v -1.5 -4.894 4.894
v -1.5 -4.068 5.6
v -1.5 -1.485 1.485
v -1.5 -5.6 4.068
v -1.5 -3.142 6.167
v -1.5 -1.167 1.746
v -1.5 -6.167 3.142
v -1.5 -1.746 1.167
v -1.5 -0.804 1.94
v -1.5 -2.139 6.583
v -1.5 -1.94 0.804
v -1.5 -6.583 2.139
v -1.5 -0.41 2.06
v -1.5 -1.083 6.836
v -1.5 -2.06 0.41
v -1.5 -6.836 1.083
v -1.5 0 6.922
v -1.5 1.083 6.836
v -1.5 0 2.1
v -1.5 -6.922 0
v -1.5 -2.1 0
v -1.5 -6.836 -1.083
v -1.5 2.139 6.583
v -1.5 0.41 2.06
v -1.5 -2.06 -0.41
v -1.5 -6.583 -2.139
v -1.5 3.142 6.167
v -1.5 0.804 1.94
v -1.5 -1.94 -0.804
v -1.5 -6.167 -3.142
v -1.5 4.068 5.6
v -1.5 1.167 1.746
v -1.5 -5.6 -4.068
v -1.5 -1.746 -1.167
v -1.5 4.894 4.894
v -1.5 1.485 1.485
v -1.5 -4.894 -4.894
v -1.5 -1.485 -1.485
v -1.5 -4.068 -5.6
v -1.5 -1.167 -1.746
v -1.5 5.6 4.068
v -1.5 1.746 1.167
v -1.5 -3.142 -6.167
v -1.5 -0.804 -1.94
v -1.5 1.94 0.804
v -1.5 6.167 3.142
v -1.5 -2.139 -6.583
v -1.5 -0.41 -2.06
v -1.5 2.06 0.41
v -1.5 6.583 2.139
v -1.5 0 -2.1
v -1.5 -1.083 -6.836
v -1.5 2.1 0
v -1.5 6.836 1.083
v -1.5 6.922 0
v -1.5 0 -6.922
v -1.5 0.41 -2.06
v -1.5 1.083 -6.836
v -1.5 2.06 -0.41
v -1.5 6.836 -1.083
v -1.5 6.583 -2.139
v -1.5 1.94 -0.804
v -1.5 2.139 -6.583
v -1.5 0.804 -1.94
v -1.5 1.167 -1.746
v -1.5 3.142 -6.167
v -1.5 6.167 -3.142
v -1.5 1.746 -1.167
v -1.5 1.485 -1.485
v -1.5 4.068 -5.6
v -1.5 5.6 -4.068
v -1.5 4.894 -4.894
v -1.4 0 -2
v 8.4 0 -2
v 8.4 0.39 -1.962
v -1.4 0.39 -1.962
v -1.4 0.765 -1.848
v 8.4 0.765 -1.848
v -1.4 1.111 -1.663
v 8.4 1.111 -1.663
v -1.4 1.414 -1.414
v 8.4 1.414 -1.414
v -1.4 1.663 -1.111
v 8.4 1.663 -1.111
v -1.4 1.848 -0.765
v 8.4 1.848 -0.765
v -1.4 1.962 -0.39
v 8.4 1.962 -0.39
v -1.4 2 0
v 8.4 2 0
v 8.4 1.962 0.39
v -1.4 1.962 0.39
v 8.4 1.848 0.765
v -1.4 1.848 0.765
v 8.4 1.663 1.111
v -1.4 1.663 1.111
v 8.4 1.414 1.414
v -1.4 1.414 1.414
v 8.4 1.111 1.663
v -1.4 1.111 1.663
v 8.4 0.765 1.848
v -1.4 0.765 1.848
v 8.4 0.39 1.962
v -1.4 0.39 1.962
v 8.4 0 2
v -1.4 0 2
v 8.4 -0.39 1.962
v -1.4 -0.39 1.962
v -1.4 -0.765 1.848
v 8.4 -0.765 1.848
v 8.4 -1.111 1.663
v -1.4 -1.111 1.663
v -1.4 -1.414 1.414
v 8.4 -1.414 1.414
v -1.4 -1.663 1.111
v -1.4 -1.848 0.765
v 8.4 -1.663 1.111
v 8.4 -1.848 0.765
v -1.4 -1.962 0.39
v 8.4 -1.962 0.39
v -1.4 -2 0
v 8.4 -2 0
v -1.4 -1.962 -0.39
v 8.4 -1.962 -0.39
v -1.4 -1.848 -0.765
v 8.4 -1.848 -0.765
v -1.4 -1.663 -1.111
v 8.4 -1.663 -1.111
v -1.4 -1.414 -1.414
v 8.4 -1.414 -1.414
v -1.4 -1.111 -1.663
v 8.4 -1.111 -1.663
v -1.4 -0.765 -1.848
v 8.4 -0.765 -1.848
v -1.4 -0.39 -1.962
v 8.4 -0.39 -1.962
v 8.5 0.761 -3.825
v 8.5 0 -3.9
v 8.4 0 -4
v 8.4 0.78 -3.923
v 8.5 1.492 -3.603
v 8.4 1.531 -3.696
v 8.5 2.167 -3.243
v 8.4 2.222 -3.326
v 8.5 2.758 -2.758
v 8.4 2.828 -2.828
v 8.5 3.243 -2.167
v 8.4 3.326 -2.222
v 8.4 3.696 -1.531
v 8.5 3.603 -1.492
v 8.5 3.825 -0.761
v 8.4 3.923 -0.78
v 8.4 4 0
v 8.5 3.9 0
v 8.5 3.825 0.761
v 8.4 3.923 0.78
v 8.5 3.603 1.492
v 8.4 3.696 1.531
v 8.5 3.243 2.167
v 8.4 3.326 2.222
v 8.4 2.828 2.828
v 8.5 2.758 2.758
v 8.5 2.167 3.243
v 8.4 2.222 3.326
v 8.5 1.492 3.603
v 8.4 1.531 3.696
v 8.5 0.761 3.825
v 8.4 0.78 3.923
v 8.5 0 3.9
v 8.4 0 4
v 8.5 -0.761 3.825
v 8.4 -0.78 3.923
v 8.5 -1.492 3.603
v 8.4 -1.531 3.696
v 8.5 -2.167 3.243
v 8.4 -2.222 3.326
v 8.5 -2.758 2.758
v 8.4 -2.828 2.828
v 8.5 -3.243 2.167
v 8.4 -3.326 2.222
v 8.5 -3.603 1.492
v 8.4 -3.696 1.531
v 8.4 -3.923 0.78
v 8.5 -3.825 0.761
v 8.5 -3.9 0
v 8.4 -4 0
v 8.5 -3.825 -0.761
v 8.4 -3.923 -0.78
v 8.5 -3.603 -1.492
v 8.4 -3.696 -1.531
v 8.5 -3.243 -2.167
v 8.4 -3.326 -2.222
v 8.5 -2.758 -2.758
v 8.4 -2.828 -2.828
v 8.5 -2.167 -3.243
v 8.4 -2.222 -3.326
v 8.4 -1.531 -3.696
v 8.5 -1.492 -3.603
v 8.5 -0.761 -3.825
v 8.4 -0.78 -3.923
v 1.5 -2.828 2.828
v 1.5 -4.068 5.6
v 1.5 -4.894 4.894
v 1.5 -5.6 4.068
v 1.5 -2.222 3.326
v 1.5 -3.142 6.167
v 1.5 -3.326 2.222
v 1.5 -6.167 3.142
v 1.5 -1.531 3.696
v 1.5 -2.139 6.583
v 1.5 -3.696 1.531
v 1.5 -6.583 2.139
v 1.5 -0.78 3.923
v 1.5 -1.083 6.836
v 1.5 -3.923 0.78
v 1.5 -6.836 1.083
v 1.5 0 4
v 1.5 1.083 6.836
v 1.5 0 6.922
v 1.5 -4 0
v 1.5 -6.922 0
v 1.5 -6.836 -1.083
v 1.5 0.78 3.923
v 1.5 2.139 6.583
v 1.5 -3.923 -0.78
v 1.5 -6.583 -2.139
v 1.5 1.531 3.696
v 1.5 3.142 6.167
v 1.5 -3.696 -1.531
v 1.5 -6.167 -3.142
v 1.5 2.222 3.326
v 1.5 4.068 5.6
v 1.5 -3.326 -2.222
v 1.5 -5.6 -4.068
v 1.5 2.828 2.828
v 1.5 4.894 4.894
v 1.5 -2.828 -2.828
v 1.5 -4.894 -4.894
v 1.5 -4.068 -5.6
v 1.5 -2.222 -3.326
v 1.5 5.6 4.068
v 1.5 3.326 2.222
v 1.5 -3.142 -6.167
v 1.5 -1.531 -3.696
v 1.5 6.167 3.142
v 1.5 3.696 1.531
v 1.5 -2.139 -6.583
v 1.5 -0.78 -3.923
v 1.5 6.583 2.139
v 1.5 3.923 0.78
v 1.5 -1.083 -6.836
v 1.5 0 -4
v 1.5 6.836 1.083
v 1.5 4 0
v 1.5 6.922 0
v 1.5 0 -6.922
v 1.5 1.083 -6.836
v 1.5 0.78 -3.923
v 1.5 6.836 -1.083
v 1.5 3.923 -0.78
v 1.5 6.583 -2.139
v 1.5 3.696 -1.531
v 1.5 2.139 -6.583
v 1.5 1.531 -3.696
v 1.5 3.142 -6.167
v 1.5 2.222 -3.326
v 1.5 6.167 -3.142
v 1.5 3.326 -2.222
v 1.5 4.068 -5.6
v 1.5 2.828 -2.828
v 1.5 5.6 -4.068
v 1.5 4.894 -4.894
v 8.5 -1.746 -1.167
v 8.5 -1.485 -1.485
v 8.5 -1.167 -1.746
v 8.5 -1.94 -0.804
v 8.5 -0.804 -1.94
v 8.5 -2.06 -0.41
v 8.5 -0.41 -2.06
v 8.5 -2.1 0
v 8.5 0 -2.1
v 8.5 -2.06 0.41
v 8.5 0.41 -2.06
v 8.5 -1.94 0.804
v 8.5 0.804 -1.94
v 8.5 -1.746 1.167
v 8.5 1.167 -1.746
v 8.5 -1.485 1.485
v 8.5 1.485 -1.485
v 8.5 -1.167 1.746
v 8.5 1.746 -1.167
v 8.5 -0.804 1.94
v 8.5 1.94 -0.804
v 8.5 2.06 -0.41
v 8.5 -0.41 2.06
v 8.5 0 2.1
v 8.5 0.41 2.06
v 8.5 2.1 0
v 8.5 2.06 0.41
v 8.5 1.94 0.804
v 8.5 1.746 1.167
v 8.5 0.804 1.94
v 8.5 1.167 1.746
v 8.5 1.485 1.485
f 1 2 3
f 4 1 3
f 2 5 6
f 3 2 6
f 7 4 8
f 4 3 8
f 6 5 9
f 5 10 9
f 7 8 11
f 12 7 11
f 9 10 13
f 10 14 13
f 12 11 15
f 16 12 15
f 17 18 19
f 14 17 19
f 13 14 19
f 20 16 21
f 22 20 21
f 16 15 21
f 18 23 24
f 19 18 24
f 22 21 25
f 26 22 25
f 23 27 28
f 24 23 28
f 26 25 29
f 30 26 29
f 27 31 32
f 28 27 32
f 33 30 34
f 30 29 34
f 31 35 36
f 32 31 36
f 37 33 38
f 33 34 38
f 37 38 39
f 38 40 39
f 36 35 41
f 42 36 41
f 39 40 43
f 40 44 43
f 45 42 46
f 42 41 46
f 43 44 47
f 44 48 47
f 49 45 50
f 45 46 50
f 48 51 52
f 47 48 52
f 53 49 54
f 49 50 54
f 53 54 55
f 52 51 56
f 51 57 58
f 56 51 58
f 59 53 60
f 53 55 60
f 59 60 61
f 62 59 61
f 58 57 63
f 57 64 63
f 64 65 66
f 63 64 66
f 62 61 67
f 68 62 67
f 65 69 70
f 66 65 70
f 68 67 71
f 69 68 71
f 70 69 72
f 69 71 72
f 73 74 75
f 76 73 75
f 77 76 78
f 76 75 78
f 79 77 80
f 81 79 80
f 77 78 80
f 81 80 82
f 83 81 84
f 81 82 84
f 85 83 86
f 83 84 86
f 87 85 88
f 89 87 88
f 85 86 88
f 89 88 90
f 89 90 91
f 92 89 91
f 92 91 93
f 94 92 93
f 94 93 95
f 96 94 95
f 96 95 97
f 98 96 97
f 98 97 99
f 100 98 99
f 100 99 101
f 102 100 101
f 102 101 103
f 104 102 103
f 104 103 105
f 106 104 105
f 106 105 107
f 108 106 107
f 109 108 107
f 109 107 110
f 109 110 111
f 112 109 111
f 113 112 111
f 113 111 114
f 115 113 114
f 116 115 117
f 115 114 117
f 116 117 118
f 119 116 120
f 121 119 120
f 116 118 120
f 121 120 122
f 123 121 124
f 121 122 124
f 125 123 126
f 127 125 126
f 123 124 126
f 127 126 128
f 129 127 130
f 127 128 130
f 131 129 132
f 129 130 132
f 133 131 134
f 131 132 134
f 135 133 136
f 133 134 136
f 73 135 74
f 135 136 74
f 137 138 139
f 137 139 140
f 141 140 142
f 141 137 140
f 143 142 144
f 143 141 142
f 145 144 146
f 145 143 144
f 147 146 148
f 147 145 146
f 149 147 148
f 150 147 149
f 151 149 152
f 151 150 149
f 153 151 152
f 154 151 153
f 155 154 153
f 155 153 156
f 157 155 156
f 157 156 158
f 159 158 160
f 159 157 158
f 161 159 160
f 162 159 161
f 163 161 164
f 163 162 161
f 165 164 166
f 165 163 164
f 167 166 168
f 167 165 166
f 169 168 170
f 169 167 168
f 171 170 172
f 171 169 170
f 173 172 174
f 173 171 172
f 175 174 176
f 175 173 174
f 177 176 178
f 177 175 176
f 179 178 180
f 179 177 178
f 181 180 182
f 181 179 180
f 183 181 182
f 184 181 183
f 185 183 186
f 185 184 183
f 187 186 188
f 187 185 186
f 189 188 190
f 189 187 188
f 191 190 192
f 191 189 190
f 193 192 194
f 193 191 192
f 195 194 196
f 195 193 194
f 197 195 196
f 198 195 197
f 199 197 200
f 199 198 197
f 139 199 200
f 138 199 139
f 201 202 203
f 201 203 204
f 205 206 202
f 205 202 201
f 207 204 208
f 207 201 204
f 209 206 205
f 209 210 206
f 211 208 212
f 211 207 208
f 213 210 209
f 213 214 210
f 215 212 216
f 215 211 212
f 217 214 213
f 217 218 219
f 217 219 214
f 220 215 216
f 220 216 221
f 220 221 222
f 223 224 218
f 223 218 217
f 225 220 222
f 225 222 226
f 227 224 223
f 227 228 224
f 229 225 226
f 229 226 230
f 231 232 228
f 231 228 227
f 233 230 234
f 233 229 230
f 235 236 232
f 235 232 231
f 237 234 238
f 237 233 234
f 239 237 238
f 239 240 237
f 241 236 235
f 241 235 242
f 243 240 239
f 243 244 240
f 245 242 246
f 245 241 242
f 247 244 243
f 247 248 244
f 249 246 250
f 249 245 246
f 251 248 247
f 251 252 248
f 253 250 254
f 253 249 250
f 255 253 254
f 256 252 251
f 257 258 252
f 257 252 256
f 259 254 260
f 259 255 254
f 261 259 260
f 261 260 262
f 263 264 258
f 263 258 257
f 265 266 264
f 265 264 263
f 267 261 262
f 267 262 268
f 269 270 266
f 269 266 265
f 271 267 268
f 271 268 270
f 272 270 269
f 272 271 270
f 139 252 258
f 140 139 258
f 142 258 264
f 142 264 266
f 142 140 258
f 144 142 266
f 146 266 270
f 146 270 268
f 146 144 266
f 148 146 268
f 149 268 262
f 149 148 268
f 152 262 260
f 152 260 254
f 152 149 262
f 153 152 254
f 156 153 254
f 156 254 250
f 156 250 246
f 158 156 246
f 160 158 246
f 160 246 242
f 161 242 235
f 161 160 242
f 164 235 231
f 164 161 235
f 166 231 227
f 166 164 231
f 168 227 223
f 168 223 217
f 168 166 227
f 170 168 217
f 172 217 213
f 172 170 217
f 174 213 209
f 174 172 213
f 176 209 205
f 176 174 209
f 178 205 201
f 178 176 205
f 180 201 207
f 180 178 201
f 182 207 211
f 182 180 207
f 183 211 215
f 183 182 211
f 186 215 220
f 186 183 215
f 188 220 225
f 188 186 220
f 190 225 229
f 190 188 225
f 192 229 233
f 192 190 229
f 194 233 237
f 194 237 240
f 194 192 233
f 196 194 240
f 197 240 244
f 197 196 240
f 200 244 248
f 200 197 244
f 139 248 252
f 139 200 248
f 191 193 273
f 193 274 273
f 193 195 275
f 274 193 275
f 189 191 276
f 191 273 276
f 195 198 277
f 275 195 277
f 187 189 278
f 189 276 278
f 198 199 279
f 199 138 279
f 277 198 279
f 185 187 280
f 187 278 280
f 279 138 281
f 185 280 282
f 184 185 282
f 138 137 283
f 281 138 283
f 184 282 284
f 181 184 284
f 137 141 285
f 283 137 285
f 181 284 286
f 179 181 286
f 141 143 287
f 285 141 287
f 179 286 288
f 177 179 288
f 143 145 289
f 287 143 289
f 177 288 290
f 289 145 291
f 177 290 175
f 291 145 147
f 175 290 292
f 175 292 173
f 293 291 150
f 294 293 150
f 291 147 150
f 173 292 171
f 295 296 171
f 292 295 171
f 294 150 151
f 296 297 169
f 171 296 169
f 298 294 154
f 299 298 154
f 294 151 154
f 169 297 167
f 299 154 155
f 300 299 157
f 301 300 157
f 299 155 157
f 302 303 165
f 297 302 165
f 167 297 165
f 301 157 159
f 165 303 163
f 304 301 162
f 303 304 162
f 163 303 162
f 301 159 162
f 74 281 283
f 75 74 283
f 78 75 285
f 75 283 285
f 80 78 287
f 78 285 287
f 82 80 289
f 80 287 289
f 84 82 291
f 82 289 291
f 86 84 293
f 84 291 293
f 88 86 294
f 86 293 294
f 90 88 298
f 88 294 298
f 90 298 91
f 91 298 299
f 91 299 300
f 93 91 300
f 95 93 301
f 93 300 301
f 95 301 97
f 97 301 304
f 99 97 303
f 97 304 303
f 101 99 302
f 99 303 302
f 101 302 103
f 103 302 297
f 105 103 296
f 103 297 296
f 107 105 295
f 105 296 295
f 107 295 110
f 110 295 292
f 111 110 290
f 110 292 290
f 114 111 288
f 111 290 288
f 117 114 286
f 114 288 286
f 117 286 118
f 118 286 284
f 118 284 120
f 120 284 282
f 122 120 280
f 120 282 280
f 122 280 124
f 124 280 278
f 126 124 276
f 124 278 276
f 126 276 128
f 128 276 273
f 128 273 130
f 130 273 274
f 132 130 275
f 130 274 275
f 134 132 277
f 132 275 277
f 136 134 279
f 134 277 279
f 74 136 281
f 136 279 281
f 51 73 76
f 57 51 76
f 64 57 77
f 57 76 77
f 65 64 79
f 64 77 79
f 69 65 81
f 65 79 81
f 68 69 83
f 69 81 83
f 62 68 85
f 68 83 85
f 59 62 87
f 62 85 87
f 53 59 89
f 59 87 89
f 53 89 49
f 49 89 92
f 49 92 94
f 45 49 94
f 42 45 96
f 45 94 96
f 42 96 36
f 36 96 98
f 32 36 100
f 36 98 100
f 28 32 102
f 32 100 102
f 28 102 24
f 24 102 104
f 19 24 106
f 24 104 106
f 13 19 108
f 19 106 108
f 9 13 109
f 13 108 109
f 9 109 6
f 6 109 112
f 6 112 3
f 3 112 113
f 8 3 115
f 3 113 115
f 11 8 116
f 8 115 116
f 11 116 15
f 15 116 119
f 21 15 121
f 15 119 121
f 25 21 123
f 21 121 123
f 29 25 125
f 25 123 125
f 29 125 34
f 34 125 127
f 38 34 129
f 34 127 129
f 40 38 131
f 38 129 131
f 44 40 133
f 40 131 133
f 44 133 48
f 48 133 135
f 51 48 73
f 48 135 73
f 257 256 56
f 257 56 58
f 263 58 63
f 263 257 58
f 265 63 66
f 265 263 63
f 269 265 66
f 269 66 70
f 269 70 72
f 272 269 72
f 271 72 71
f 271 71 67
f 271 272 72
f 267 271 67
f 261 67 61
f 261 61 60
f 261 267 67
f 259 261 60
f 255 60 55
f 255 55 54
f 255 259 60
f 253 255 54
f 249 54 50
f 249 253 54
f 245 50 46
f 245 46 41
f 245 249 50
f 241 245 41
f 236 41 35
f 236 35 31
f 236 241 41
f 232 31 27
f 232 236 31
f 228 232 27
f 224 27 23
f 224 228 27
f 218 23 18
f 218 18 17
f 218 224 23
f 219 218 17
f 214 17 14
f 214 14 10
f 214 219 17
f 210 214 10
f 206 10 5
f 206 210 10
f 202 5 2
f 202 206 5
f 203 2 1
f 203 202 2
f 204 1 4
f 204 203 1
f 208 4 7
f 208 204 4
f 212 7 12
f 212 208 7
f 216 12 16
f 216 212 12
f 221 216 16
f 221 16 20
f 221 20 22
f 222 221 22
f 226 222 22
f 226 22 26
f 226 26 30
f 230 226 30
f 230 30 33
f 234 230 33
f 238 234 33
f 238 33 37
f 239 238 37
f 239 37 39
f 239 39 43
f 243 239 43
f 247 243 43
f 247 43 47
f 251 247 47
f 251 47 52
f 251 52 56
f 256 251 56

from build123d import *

# Parameters (mm, degrees)
SKETCH1_R                = 6.9215
BOSS_EXTRUDE1_DEPTH      = 3
SKETCH3_W                = 7
SKETCH3_H                = 4
F_4_0_4_DIAMETER_HOLE1_D = 4
CHAMFER1_SIZE            = 0.1


with BuildPart() as part:
    # Sketch1 → Boss-Extrude1 (new body)
    with BuildSketch(Plane(origin=(1.5, 0, 0), x_dir=(0, 0, -1), z_dir=(1, 0, 0))):
        Circle(SKETCH1_R)
    extrude(amount=-BOSS_EXTRUDE1_DEPTH)

    # Sketch3 → Revolve1 (revolve)
    with BuildSketch(Plane.XY, mode=Mode.PRIVATE) as revolve1_sk:
        with Locations((5, 2)):
            Rectangle(SKETCH3_W, SKETCH3_H)
    revolve(revolve1_sk.sketch.rotate(Axis((1.5, 0, 0), (1, 0, 0)), 270), axis=Axis((1.5, 0, 0), (1, 0, 0)))

    # Ø4.0 (4) Diameter Hole1 (through all)
    with Locations(Plane.ZY.offset(1.5)):
        with Locations((0, 0)):
            Hole(F_4_0_4_DIAMETER_HOLE1_D / 2)

    # Chamfer1
    chamfer1_edges = [part.edges().sort_by_distance(p)[0] for p in [
        (-1.5, 0, 2),
        (8.5, 0, 2),
        (8.5, 0, 4),
    ]]
    chamfer(chamfer1_edges, length=CHAMFER1_SIZE)


solid = part.part
